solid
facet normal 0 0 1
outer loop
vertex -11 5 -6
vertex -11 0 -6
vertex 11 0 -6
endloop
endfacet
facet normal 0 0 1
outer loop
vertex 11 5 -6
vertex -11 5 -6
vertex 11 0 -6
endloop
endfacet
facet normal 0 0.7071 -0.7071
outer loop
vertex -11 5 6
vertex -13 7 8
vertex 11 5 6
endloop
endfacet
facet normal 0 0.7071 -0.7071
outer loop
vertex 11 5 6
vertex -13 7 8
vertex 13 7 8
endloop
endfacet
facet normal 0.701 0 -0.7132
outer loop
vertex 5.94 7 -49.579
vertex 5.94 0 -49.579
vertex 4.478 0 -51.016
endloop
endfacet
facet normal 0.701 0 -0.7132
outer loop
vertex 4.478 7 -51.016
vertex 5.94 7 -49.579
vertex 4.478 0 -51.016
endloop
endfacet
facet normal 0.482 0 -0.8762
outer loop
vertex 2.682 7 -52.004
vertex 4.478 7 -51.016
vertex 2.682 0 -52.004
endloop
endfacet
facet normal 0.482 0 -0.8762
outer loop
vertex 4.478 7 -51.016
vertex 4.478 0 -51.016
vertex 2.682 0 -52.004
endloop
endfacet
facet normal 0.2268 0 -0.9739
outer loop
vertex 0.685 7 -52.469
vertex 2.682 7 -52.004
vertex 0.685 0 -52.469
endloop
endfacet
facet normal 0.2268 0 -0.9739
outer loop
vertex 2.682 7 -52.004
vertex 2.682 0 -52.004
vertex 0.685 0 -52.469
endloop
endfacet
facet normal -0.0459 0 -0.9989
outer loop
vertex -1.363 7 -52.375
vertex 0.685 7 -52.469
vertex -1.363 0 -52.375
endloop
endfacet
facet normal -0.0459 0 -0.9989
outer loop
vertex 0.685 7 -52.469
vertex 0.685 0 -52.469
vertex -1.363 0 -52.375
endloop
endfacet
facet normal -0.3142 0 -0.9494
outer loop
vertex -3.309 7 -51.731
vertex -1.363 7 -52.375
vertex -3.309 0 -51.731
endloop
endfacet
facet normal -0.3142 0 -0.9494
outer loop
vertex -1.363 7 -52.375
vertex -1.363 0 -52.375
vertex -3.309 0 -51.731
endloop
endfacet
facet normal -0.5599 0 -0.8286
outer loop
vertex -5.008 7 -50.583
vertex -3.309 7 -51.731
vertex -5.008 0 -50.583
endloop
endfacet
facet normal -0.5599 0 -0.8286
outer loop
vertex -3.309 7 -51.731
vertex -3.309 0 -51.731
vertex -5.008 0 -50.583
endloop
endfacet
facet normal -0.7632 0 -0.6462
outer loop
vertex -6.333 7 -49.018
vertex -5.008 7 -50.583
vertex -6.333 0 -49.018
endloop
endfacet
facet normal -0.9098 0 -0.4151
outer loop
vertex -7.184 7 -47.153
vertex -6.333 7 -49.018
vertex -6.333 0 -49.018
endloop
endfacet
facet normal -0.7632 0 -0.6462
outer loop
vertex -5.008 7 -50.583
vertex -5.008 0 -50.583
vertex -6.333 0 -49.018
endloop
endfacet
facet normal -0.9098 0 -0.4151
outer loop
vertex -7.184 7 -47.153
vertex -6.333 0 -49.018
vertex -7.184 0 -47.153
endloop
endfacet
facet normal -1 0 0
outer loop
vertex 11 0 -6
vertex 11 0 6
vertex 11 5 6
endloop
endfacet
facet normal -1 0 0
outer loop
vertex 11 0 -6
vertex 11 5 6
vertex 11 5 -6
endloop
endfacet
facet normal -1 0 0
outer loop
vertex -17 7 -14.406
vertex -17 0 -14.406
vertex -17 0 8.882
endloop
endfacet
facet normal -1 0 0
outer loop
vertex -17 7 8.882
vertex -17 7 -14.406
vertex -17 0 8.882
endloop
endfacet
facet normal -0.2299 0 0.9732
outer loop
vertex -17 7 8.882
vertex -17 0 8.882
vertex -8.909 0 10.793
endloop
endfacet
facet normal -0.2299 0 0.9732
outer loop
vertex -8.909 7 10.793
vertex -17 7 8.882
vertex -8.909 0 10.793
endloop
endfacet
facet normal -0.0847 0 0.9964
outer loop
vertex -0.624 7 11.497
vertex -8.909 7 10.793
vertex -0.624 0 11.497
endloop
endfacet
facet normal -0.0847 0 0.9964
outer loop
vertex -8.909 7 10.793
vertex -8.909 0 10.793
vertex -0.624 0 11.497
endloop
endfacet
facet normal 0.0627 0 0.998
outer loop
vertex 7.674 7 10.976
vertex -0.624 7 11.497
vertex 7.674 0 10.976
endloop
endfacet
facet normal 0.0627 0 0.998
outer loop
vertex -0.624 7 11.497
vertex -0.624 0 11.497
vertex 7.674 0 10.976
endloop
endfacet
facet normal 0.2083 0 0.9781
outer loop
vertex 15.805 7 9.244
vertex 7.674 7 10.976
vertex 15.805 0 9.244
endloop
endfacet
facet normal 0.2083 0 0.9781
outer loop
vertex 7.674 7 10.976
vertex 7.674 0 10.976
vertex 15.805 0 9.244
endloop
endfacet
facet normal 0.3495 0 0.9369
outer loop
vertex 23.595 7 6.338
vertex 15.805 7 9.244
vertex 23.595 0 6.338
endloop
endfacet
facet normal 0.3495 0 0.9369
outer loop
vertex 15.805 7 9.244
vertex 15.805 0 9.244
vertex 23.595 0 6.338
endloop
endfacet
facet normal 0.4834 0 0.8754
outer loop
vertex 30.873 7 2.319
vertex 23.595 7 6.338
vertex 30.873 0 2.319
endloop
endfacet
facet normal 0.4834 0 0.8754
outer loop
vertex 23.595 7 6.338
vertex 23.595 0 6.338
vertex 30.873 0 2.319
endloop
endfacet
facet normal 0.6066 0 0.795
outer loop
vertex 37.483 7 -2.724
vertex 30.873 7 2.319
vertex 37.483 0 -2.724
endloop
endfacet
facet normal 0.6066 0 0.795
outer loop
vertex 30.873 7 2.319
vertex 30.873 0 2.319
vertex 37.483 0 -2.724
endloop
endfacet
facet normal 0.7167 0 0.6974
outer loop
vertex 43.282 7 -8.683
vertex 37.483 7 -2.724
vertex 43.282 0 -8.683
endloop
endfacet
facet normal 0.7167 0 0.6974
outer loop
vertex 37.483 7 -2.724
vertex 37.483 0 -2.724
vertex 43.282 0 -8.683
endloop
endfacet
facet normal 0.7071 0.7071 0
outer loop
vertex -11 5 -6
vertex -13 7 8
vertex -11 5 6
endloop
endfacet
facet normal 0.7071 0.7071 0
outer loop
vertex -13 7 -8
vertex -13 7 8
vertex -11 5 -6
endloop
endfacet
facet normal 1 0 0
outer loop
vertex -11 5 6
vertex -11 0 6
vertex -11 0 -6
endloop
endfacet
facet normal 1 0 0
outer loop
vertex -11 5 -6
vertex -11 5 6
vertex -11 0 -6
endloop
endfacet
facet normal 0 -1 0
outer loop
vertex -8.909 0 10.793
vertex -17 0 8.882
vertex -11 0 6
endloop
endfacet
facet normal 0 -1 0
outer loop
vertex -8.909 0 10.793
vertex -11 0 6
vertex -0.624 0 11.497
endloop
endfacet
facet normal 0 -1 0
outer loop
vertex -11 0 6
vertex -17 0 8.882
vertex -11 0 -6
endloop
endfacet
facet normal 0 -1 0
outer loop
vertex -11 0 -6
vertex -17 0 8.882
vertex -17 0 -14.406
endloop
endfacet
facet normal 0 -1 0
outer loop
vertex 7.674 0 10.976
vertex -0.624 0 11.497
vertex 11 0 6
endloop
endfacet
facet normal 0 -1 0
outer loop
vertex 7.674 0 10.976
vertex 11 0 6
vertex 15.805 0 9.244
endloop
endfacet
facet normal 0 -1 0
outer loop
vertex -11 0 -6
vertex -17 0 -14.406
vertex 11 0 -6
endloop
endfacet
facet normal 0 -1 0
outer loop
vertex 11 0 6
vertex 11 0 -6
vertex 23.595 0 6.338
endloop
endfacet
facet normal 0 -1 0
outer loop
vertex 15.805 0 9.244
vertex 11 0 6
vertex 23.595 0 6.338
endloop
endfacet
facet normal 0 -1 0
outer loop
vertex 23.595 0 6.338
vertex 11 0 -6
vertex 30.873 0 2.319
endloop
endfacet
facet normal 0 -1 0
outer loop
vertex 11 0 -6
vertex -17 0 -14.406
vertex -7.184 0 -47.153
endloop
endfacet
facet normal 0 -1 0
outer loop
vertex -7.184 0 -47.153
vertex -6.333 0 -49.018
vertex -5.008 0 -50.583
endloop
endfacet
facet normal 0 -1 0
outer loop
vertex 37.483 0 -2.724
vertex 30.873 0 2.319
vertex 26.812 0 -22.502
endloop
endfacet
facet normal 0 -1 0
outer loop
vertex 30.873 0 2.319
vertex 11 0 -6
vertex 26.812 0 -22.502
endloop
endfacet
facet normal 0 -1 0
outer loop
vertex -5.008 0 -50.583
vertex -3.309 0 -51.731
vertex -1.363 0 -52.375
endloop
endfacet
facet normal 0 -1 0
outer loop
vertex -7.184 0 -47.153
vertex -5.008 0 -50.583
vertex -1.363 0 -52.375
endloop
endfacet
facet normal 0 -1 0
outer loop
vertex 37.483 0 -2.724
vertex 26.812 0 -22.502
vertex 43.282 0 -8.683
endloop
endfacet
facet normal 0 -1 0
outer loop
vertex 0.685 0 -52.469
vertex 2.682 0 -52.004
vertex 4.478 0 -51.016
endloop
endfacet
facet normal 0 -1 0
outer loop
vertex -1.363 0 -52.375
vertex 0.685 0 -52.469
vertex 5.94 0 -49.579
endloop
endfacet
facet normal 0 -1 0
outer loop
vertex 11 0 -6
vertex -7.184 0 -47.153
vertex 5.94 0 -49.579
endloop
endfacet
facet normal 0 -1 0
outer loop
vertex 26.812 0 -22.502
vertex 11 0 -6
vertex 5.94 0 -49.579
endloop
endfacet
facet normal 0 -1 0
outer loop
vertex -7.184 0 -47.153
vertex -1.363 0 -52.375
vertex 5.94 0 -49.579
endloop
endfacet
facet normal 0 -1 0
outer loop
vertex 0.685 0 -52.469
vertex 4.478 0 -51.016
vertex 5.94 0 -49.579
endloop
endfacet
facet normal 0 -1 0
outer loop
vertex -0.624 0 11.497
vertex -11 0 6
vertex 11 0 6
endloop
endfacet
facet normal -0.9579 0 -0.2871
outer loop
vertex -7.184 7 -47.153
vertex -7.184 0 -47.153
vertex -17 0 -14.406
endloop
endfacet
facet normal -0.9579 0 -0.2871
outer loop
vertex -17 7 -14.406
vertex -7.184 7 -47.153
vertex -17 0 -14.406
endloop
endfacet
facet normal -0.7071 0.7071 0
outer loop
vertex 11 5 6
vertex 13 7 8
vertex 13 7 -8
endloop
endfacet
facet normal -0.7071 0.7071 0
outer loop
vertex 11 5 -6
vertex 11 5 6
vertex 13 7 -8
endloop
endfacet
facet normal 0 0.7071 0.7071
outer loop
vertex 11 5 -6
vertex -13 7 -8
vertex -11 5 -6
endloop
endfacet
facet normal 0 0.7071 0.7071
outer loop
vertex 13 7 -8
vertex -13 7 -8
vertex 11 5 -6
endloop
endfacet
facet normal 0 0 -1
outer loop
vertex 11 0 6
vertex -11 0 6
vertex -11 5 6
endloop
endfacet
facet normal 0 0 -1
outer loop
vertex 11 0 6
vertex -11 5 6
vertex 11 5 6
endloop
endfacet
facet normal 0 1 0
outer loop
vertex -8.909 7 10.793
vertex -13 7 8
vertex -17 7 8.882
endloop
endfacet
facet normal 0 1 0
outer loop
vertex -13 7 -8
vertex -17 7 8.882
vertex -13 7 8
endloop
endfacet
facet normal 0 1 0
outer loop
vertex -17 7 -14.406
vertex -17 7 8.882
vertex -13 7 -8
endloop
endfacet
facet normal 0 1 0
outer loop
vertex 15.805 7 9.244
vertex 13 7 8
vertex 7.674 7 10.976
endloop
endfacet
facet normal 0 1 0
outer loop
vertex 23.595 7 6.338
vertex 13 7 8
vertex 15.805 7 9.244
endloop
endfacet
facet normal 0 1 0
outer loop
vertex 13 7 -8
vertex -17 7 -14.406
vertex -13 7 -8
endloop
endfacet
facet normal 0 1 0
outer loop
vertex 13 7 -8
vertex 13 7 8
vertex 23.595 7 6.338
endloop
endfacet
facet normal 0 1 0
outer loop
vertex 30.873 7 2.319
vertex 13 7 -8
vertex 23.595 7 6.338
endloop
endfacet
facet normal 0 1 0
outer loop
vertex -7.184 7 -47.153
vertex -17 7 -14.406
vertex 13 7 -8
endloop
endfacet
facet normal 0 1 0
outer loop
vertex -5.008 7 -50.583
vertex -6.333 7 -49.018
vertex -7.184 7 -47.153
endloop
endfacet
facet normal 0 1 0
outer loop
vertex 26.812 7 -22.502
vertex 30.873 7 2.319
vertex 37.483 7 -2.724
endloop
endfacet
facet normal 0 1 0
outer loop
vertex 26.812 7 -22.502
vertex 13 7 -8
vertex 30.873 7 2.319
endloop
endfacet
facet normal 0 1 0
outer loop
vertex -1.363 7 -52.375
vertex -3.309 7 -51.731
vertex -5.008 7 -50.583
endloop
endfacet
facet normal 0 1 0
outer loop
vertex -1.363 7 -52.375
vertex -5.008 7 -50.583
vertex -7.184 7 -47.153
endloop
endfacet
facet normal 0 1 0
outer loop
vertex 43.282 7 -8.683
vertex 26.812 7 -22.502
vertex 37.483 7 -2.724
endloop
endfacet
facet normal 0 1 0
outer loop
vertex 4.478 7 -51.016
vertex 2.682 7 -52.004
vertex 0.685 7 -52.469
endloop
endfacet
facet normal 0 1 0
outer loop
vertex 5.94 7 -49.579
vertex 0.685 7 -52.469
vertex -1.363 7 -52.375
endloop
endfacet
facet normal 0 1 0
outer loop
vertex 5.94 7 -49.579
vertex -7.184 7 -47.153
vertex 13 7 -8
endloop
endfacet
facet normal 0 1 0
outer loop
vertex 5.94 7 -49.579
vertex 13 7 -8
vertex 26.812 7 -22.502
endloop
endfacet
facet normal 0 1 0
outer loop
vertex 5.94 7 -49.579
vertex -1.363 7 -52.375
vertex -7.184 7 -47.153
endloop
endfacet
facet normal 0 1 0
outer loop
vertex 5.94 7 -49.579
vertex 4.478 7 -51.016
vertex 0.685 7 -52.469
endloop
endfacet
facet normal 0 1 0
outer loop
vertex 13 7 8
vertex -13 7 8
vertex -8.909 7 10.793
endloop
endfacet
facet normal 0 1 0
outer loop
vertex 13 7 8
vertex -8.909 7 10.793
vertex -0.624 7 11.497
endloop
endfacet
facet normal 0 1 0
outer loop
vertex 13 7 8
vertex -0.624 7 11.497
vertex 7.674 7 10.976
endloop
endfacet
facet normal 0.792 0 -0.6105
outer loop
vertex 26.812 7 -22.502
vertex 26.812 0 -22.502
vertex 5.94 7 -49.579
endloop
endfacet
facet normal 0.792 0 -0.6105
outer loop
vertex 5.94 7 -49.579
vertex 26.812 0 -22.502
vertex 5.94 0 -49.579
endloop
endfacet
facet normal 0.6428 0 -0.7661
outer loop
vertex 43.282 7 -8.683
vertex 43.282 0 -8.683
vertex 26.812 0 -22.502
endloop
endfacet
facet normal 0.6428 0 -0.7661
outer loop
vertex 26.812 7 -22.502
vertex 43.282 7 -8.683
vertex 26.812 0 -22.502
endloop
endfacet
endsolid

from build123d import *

# Parameters (mm, degrees)
SKETCH1_W           = 22
SKETCH1_H           = 12
BOSS_EXTRUDE1_DEPTH = 7
CHAMFER1_SIZE       = 2


with BuildPart() as part:
    # Sketch1 → Boss-Extrude1 (new body)
    with BuildSketch(Plane(origin=(0, 0, 0), x_dir=(1, 0, 0), z_dir=(0, 1, 0))):
        with BuildLine():
            Line((26.811555509, 22.502433661), (5.940065191, 49.578823596))
            ThreePointArc((5.940065191, 49.578823596), (-1.362951292, 52.375117882), (-7.184208043, 47.153405394))
            Line((-7.184208043, 47.153405394), (-17, 14.405882918))
            Line((-17, 14.405882918), (-17, -8.881815114))
            ThreePointArc((-17, -8.881815114), (15.805244301, -9.244301568), (43.281511036, 8.682500053))
            Line((43.281511036, 8.682500053), (26.811555509, 22.502433661))
        make_face()
        Rectangle(SKETCH1_W, SKETCH1_H, mode=Mode.SUBTRACT)
    extrude(amount=BOSS_EXTRUDE1_DEPTH)

    # Chamfer1
    chamfer1_edges = [part.edges().sort_by_distance(p)[0] for p in [
        (0, 7, -6),
        (11, 7, 0),
        (0, 7, 6),
        (-11, 7, 0),
    ]]
    chamfer(chamfer1_edges, length=CHAMFER1_SIZE)


solid = part.part
